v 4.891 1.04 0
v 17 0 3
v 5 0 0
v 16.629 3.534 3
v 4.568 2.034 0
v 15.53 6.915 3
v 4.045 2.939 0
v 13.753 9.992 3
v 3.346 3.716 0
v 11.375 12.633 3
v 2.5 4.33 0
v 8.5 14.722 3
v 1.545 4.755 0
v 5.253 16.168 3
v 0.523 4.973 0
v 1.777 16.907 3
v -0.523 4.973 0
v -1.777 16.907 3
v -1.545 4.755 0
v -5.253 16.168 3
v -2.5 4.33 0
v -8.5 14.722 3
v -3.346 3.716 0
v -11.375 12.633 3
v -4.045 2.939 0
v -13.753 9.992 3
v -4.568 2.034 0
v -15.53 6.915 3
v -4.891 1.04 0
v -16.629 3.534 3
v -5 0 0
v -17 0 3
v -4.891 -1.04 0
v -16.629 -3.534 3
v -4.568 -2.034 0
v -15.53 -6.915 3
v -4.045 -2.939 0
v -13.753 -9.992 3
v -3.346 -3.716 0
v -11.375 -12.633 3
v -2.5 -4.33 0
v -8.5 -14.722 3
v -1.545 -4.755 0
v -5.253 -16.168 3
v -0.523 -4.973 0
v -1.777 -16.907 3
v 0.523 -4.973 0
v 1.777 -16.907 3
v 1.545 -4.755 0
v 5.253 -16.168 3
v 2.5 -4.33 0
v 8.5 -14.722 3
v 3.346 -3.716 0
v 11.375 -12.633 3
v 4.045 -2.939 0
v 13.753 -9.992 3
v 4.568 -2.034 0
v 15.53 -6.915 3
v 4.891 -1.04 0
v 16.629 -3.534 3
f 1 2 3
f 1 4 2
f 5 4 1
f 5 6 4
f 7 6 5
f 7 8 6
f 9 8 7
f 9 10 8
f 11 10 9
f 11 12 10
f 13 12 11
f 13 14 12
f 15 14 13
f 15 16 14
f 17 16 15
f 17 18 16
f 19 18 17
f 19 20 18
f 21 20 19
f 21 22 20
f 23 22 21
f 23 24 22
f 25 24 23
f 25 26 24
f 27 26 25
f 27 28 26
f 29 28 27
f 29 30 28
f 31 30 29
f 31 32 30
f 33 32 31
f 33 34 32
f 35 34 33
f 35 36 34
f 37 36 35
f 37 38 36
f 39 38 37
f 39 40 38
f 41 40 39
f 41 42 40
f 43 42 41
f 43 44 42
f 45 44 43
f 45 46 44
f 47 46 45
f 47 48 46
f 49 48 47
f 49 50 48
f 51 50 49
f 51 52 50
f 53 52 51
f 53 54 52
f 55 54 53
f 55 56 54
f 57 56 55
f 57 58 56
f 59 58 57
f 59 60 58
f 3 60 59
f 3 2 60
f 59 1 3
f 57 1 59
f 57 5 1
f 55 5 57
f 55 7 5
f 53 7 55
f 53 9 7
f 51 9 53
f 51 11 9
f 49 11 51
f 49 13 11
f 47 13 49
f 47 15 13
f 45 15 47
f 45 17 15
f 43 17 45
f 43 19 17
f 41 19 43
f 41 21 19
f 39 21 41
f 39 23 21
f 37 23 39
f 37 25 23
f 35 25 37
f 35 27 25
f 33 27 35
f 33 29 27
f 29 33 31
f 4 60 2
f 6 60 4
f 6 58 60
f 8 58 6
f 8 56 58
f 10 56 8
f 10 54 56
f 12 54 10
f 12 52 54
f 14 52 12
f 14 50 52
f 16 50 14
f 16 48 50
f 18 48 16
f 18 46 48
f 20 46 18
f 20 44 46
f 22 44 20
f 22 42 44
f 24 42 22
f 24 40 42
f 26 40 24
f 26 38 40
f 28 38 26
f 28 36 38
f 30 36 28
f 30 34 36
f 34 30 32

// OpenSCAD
// Generated by SolidPython 1.0.1 on 2020-07-29 00:02:42


cylinder(h = 3, r1 = 5, r2 = 17);
/***********************************************
*********      SolidPython code:      **********
************************************************
 
# import packages: SolidPython
from solid import *
from solid.utils import *
from itertools import chain, combinations


class Resize:

    def __init__(self, scad_file):
        self.scad_file = scad_file
        #self.scad_file = import_scad(scad_file)
        # cone/cylinder param:
        self.r1 = 0
        self.r2 = 0
        self.h = 0
        # rectangular prism param:
        self.w = 0
        self.l = 0
        # ellipse param:
        self.r = 0

    # import OpenScad code (file name corresponds to shape)


    # classify shape + parameters
    def assign(self, param1, param2, param3):
        if self.scad_file == 'cone.scad':
            self.r1 = param1
            self.r2 = param2
            self.h = param3
        elif self.scad_file == 'cylinder.scad':
            self.r1 = param1
            self.r2 = param2
            self.h = param3
        elif self.scad_file == 'rectangularPrism.scad':
            self.h = param1
            self.l = param2
            self.w = param3
        else:
            self.r = param1
            self.h = param2

    # resize parameters
    def iterate(self):
        x = range(3, 20, 2)
        i = 1
        if self.scad_file == 'cone.scad':
            tempList = list(combinations(x, 3))
            #print(tempList)
            for i in x:
                for j in range (3):
                    param1 = tempList[i][0]
                    param2 = tempList[i][1]
                    param3 = tempList[i][2]
                    filepath = 'produced_scad_files/' + 'cone' + str(param1) + '_' + str(param2) + '_' + str(param3) + '.scad'
                    scad_render_to_file(cylinder(h=param1, r1=param2, r2=param3), filepath)

        elif self.scad_file == 'cylinder.scad':
            tempList = list(combinations(x, 3))
            for i in x:
                for j in range(3):
                    param1 = tempList[i][0]
                    param2 = tempList[i][1]
                    param3 = tempList[i][2]
                    filepath = 'produced_scad_files/' + 'cylinder' + str(param1) + '_' + str(param2) + '_' + str(param3) + '.scad'
                    scad_render_to_file(cylinder(h=param1, r1=param2, r2=param3), filepath)

        elif self.scad_file == 'rectangularPrism.scad':
            tempList = list(combinations(x, 3))
            for i in x:
                for j in range(3):
                    param1 = tempList[i][0]
                    param2 = tempList[i][1]
                    param3 = tempList[i][2]
                    filepath = 'produced_scad_files/' + 'rectangularPrism' + str(param1) + '_' + str(param2) + '_' + str(
                        param3) + '.scad'
                    scad_render_to_file(cube(size=(param1, param2, param3)), filepath)

        else:
            tempList = list(combinations(x, 2))
            for i in x:
                for j in range(3):
                    param1 = tempList[i][0]
                    param2 = tempList[i][1]
                    filepath = 'produced_scad_files/' + 'ellipse' + str(param1) + '_' + str(param2) + '_' + '.scad'
                    scad_render_to_file(sphere(param1, param2), filepath)

    def render_to_scadfile(self):
        scad_render_to_file(scad, 'example.scad') 
 
************************************************/
